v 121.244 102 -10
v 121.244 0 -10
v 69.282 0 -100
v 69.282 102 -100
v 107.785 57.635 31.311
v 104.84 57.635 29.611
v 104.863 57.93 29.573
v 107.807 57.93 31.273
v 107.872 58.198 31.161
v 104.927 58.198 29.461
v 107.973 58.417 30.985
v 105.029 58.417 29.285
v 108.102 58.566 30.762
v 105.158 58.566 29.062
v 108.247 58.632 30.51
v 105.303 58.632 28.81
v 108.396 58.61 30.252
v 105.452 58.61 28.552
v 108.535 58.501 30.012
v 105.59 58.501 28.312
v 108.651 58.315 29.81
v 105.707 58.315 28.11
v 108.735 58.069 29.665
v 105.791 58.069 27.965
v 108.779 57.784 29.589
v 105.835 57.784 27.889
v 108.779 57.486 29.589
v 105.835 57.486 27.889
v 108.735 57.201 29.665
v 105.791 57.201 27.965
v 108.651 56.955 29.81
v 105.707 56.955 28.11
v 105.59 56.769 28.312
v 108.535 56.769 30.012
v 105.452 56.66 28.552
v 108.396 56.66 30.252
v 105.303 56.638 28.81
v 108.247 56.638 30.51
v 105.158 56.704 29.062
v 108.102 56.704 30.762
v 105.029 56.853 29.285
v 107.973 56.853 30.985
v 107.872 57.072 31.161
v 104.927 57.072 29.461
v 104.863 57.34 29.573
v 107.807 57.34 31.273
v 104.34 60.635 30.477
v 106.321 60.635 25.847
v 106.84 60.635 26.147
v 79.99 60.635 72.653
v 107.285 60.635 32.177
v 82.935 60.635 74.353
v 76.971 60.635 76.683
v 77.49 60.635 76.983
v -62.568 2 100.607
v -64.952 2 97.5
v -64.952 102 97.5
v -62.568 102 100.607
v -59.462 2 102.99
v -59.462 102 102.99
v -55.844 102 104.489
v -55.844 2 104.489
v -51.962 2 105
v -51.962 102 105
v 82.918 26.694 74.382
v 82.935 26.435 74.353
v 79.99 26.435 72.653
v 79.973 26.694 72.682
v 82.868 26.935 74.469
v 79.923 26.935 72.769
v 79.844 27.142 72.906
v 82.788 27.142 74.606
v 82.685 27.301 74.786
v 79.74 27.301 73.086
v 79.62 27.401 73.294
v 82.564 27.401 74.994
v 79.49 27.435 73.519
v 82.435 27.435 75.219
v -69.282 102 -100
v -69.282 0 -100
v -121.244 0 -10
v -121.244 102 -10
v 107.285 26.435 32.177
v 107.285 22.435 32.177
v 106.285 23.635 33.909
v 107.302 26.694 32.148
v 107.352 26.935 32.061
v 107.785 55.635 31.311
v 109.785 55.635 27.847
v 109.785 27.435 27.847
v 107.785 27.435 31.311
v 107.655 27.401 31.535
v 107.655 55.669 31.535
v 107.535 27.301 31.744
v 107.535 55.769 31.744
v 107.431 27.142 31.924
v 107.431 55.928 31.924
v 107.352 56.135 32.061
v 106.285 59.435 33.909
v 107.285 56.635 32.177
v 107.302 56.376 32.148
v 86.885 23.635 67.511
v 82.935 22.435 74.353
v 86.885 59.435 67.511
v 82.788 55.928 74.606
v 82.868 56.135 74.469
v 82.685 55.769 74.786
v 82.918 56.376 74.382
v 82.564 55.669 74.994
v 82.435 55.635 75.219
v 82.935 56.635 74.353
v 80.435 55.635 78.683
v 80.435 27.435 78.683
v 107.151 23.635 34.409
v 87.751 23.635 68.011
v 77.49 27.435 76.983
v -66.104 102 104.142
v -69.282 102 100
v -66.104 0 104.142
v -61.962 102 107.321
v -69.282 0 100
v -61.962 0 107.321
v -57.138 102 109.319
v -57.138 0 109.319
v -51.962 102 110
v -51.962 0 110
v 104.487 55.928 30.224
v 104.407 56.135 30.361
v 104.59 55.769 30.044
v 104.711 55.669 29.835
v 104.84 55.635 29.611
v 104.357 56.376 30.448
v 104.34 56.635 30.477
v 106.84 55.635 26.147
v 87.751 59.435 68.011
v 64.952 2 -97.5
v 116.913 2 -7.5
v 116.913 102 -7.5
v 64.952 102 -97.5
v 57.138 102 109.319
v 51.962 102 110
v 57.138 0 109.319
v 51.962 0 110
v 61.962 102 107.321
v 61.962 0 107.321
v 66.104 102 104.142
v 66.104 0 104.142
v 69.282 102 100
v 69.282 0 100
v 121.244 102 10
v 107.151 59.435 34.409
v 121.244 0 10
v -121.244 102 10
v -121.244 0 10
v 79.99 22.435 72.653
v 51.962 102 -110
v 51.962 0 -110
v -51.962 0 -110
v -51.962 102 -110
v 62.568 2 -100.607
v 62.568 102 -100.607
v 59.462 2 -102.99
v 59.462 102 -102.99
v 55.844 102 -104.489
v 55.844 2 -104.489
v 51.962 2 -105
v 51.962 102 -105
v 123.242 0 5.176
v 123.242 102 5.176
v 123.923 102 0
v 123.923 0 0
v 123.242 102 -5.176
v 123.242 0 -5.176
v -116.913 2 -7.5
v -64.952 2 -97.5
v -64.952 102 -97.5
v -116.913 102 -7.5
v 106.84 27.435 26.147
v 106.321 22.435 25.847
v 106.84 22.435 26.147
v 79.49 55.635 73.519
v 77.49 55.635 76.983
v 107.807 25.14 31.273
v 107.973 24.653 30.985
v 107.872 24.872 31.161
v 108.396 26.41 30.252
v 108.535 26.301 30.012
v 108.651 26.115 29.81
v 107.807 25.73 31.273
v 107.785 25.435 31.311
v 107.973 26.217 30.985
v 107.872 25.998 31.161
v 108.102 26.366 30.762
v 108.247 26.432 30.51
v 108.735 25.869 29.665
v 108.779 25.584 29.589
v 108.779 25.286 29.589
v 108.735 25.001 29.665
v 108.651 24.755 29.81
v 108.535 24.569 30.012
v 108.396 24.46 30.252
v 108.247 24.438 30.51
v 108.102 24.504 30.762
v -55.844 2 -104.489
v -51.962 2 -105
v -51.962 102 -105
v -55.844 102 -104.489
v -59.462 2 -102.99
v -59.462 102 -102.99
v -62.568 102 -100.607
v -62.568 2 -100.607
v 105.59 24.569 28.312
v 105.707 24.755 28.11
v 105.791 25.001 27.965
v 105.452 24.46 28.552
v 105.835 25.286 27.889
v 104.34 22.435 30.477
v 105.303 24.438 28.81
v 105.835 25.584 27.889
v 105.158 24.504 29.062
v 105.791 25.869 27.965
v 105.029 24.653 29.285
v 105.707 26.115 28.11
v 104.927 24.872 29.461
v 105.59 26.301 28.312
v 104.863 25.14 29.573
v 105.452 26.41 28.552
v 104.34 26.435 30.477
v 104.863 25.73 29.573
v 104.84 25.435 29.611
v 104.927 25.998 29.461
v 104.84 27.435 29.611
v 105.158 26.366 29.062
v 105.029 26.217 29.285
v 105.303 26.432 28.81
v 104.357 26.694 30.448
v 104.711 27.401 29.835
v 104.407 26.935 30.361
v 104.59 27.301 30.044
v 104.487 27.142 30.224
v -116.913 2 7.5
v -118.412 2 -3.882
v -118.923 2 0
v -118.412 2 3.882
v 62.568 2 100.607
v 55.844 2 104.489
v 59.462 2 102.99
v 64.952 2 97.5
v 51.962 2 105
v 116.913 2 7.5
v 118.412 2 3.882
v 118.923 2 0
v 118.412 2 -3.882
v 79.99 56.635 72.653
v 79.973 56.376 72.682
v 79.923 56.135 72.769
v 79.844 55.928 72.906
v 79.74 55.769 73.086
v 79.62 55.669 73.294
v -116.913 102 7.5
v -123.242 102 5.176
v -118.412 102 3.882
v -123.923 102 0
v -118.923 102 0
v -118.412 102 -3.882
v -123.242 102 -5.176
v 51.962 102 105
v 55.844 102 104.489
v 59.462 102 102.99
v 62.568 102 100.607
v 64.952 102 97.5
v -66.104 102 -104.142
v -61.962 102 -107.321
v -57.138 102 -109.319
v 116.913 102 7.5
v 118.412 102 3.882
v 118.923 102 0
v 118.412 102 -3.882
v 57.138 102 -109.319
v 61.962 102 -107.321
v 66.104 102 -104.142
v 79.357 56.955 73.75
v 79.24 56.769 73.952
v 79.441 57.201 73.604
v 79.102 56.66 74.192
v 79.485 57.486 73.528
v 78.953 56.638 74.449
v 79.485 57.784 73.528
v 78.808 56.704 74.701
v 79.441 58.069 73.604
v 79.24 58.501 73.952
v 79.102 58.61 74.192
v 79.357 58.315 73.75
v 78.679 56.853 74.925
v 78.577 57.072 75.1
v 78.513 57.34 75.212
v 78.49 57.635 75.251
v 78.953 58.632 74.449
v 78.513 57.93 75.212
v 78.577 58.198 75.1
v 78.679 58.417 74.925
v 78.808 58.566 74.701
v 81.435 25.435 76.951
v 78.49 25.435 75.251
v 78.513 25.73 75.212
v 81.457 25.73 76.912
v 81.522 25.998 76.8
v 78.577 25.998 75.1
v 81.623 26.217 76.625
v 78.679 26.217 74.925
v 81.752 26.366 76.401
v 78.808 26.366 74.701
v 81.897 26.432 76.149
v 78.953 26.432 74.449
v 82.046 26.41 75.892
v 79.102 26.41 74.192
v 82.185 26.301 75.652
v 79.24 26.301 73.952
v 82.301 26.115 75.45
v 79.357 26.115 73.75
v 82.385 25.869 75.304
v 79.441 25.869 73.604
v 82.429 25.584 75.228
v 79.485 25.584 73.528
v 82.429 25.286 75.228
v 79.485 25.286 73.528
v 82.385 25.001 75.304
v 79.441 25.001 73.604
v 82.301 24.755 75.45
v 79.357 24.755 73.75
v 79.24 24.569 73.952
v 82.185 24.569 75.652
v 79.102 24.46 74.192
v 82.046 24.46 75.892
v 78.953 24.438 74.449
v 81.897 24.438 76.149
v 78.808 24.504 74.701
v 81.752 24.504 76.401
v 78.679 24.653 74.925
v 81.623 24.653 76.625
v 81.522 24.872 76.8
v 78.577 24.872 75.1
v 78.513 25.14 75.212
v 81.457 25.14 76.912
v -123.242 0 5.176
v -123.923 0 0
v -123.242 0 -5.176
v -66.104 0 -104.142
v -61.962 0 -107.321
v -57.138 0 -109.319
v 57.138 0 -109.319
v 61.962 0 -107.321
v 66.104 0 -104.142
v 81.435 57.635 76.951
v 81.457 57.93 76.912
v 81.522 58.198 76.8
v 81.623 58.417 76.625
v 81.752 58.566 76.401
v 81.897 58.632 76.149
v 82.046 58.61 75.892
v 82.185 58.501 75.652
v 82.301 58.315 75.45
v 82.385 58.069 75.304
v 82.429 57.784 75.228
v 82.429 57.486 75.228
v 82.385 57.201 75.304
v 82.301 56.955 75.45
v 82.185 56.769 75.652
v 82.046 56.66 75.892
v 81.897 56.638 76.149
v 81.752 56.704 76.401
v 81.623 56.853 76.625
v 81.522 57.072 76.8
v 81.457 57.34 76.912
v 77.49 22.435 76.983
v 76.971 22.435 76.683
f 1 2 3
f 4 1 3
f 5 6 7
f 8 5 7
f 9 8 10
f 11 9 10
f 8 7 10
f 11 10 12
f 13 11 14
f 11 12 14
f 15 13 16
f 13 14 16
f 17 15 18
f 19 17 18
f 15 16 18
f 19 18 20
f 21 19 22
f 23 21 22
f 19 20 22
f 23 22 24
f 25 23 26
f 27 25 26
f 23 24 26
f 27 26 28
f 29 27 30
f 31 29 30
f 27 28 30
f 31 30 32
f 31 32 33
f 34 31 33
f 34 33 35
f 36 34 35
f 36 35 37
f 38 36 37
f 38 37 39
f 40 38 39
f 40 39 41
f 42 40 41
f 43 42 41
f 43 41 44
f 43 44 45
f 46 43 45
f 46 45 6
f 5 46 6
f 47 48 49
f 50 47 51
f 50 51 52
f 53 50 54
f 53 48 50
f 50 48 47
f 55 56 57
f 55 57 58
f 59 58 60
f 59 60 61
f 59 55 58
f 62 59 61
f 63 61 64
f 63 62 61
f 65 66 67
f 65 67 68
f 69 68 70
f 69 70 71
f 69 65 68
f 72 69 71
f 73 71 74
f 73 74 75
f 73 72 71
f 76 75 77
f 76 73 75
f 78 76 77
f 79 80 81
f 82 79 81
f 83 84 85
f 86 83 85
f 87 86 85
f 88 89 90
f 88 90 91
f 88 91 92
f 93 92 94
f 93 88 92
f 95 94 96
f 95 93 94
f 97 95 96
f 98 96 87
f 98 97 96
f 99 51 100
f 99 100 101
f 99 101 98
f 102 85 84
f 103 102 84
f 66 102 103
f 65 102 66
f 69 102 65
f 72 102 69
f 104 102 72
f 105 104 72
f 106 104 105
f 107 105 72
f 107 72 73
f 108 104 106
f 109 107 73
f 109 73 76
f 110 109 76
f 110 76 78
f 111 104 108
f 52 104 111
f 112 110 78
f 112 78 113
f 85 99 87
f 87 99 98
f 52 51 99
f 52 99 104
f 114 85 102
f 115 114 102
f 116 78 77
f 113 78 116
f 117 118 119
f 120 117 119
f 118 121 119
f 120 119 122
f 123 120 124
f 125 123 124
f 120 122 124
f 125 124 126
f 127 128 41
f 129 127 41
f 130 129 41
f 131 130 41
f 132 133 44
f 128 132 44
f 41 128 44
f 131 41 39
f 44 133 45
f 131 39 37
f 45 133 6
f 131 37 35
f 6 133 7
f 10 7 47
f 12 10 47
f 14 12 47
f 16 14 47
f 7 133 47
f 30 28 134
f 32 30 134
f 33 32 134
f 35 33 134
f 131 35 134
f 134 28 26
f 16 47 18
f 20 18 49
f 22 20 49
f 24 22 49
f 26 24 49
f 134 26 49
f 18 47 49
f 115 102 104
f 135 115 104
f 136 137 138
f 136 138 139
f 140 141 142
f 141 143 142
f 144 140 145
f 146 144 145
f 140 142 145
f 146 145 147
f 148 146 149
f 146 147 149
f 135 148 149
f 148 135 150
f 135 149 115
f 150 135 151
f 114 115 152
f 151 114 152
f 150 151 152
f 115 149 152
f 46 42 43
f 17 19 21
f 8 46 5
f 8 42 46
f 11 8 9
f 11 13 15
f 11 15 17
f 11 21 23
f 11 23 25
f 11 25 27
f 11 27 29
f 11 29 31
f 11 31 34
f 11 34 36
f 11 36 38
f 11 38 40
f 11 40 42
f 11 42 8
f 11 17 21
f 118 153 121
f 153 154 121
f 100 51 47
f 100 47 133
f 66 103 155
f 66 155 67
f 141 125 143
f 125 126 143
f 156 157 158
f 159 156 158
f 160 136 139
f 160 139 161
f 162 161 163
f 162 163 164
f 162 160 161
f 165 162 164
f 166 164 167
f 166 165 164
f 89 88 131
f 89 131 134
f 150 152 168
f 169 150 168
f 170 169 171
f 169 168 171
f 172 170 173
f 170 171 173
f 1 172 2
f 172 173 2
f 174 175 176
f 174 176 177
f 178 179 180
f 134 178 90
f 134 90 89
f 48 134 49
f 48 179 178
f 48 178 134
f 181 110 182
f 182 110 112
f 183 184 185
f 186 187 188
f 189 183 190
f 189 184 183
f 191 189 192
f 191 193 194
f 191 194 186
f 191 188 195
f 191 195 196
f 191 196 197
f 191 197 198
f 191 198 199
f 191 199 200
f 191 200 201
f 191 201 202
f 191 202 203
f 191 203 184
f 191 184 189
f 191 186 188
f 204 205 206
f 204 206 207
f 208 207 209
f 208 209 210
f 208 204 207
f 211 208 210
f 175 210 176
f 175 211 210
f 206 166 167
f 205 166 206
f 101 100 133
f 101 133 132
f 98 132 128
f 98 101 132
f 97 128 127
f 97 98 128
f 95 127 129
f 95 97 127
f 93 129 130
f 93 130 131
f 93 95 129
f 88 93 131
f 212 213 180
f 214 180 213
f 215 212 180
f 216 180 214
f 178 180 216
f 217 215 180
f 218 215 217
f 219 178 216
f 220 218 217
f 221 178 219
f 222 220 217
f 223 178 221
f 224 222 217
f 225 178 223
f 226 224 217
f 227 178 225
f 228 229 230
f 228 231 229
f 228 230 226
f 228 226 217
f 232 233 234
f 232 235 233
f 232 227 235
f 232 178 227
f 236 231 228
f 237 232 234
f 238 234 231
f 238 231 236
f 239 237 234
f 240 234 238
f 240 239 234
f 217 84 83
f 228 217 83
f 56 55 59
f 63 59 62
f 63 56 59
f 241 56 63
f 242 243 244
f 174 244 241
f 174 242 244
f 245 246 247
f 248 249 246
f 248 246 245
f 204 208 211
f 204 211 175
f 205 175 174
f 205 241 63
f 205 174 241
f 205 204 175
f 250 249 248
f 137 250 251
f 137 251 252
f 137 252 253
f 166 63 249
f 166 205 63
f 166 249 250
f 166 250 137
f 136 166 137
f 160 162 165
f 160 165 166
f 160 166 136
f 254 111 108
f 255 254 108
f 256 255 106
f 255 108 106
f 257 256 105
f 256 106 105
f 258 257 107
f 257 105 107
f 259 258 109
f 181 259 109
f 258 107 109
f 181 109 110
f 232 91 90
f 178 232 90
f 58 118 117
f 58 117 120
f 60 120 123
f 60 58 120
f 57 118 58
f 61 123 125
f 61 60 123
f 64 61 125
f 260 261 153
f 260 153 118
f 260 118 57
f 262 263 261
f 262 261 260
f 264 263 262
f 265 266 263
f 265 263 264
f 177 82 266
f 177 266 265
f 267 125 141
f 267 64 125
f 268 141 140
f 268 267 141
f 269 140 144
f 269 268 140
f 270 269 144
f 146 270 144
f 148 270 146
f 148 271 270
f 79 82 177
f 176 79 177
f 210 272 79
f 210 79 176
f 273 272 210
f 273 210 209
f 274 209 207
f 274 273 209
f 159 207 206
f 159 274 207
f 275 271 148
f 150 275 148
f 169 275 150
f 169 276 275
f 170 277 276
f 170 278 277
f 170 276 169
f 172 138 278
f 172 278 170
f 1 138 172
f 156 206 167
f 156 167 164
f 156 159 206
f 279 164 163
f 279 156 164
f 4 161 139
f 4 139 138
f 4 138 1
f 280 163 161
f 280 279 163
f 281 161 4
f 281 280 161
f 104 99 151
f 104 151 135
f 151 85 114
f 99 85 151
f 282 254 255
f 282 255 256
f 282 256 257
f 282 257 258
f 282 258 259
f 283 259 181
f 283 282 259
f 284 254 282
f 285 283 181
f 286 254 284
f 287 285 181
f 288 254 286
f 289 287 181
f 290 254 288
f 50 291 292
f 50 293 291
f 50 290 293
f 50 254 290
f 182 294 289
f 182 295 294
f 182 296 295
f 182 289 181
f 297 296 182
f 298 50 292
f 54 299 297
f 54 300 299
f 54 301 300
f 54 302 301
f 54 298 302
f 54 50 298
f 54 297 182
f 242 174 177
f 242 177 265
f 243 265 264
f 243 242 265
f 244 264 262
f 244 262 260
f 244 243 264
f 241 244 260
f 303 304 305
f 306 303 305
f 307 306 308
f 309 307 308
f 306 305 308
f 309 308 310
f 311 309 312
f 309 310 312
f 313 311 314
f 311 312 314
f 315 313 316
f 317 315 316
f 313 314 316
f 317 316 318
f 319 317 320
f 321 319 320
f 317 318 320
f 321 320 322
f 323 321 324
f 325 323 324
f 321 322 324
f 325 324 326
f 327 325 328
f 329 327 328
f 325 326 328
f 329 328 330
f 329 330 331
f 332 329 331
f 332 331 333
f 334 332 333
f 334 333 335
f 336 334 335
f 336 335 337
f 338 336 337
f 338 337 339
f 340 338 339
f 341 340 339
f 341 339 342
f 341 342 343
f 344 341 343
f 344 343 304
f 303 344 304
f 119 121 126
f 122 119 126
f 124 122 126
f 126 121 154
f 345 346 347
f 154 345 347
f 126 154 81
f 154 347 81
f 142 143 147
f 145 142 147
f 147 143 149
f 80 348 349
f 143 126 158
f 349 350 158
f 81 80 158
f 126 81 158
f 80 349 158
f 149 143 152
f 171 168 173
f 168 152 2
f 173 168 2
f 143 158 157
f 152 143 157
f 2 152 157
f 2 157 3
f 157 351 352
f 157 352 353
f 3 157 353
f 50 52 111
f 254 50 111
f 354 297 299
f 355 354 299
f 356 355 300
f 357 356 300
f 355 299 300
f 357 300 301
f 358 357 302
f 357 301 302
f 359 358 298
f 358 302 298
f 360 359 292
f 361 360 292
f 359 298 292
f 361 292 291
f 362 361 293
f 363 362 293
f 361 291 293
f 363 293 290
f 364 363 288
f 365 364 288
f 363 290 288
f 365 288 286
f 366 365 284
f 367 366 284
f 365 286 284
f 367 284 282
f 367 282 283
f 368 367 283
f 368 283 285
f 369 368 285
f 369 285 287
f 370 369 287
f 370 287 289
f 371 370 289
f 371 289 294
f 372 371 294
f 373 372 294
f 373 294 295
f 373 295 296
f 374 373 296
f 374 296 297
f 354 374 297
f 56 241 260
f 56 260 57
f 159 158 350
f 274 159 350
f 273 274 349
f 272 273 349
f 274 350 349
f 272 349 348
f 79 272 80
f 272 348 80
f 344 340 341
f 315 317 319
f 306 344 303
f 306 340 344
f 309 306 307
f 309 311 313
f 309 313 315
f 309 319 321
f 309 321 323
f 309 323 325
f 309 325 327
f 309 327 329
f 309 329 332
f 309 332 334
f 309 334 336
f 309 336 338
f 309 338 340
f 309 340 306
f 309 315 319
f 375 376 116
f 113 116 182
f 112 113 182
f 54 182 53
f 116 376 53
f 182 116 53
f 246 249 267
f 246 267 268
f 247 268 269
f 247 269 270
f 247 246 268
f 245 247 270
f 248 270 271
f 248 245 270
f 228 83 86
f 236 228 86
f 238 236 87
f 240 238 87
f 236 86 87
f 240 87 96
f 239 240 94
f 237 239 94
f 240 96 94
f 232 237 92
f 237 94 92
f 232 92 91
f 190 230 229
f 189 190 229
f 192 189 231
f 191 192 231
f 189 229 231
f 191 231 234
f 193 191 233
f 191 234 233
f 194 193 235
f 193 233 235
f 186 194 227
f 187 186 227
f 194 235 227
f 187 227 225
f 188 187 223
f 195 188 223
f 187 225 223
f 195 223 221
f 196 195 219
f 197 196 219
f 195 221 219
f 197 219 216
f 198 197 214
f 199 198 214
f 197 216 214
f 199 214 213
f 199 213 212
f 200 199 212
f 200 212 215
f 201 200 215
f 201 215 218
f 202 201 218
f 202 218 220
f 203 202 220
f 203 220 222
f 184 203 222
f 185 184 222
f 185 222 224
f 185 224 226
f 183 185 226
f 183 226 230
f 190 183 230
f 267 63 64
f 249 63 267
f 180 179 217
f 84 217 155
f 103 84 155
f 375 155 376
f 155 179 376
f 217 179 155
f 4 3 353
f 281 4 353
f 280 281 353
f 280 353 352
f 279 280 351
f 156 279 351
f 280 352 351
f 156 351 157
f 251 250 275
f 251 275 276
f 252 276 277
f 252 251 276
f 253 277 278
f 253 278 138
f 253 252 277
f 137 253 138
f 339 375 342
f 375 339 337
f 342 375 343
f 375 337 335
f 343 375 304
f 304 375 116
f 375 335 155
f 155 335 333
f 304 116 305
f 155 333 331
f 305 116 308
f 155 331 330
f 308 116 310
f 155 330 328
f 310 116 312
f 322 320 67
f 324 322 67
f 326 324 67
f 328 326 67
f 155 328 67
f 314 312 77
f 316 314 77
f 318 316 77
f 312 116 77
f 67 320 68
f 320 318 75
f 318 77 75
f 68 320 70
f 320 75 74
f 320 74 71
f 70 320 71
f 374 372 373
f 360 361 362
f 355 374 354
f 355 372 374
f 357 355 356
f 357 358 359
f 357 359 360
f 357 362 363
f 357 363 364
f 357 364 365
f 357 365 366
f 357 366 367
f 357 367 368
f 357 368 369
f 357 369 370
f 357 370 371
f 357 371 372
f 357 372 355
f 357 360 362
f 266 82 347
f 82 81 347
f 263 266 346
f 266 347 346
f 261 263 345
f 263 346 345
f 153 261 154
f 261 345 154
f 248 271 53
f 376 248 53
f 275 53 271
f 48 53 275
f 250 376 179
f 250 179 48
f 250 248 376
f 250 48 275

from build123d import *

# Parameters (mm, degrees)
SALIENTE_EXTRUIR1_DEPTH = 2
SALIENTE_EXTRUIR2_DEPTH = 100
CROQUIS3_W              = 58.7
CROQUIS3_H              = 38.2
CROQUIS3_R              = 1.5
CROQUIS3_W_2            = 38.8
CROQUIS3_H_2            = 35.8
CORTAR_EXTRUIR1_DEPTH   = 1
CROQUIS4_W              = 38.8
CROQUIS4_H              = 35.8
CORTAR_EXTRUIR2_DEPTH   = 12
CROQUIS5_W              = 58.7
CROQUIS5_H              = 38.2
CROQUIS5_R              = 1.5
CORTAR_EXTRUIR3_DEPTH   = 3
CROQUIS6_R              = 1
SALIENTE_EXTRUIR3_DEPTH = 3.4
CROQUIS8_R              = 1
CORTAR_EXTRUIR5_DEPTH   = 4
CORTAR_EXTRUIR6_DEPTH   = 0.6


with BuildPart() as part:
    # Croquis1 → Saliente-Extruir1 (new body)
    with BuildSketch(Plane(origin=(0, 0, 0), x_dir=(1, 0, 0), z_dir=(0, 1, 0))):
        with BuildLine():
            Line((-121.24355653, -10), (-69.282032303, -100))
            ThreePointArc((-69.282032303, -100), (-61.961524227, -107.320508076), (-51.961524227, -110))
            Line((-51.961524227, -110), (51.961524227, -110))
            ThreePointArc((51.961524227, -110), (61.961524227, -107.320508076), (69.282032303, -100))
            Line((69.282032303, -100), (121.24355653, -10))
            ThreePointArc((121.24355653, -10), (123.923048454, 0), (121.24355653, 10))
            Line((121.24355653, 10), (69.282032303, 100))
            ThreePointArc((69.282032303, 100), (61.961524227, 107.320508076), (51.961524227, 110))
            Line((51.961524227, 110), (-51.961524227, 110))
            ThreePointArc((-51.961524227, 110), (-61.961524227, 107.320508076), (-69.282032303, 100))
            Line((-69.282032303, 100), (-121.24355653, 10))
            ThreePointArc((-121.24355653, 10), (-123.923048454, 0), (-121.24355653, -10))
        make_face()
    extrude(amount=SALIENTE_EXTRUIR1_DEPTH)

    # Croquis2 → Saliente-Extruir2 (add)
    with BuildSketch(Plane(origin=(0, 2, 0), x_dir=(1, 0, 0), z_dir=(0, 1, 0))):
        with BuildLine():
            Line((-69.282032303, 100), (-121.24355653, 10))
            ThreePointArc((-121.24355653, 10), (-123.923048454, 0), (-121.24355653, -10))
            Line((-121.24355653, -10), (-69.282032303, -100))
            ThreePointArc((-69.282032303, -100), (-61.961524227, -107.320508076), (-51.961524227, -110))
            Line((-51.961524227, -110), (51.961524227, -110))
            ThreePointArc((51.961524227, -110), (61.961524227, -107.320508076), (69.282032303, -100))
            Line((69.282032303, -100), (121.24355653, -10))
            ThreePointArc((121.24355653, -10), (123.923048454, 0), (121.24355653, 10))
            Line((121.24355653, 10), (69.282032303, 100))
            ThreePointArc((69.282032303, 100), (61.961524227, 107.320508076), (51.961524227, 110))
            Line((51.961524227, 110), (-51.961524227, 110))
            ThreePointArc((-51.961524227, 110), (-61.961524227, 107.320508076), (-69.282032303, 100))
        make_face()
        with BuildLine():
            Line((-64.951905284, 97.5), (-116.913429511, 7.5))
            ThreePointArc((-116.913429511, 7.5), (-118.923048454, 0), (-116.913429511, -7.5))
            Line((-116.913429511, -7.5), (-64.951905284, -97.5))
            ThreePointArc((-64.951905284, -97.5), (-59.461524227, -102.990381057), (-51.961524227, -105))
            Line((-51.961524227, -105), (51.961524227, -105))
            ThreePointArc((51.961524227, -105), (59.461524227, -102.990381057), (64.951905284, -97.5))
            Line((64.951905284, -97.5), (116.913429511, -7.5))
            ThreePointArc((116.913429511, -7.5), (118.923048454, 0), (116.913429511, 7.5))
            Line((116.913429511, 7.5), (64.951905284, 97.5))
            ThreePointArc((64.951905284, 97.5), (59.461524227, 102.990381057), (51.961524227, 105))
            Line((51.961524227, 105), (-51.961524227, 105))
            ThreePointArc((-51.961524227, 105), (-59.461524227, 102.990381057), (-64.951905284, 97.5))
        make_face(mode=Mode.SUBTRACT)
    extrude(amount=SALIENTE_EXTRUIR2_DEPTH)

    # Croquis3 → Cortar-Extruir1 (cut)
    with BuildSketch(Plane(origin=(90.932667397, 0, 52.5), x_dir=(-0.49999999999999983, 0, 0.8660254037844387), z_dir=(-0.8660254037844387, 0, -0.49999999999999983))):
        with Locations((-1.426190801, 41.535179267)):
            Rectangle(CROQUIS3_W, CROQUIS3_H)
        with Locations((24.923809199, 57.635179267)):
            Circle(CROQUIS3_R, mode=Mode.SUBTRACT)
        with Locations((24.923809199, 25.435179267)):
            Circle(CROQUIS3_R, mode=Mode.SUBTRACT)
        with Locations((-27.776190801, 25.435179267)):
            Circle(CROQUIS3_R, mode=Mode.SUBTRACT)
        with Locations((-27.776190801, 57.635179267)):
            Circle(CROQUIS3_R, mode=Mode.SUBTRACT)
        with Locations((-4.376190801, 41.535179267)):
            Rectangle(CROQUIS3_W_2, CROQUIS3_H_2, mode=Mode.SUBTRACT)
    extrude(amount=-CORTAR_EXTRUIR1_DEPTH, mode=Mode.SUBTRACT)

    # Croquis4 → Cortar-Extruir2 (cut)
    with BuildSketch(Plane(origin=(90.932667397, 0, 52.5), x_dir=(-0.49999999999999983, 0, 0.8660254037844387), z_dir=(-0.8660254037844387, 0, -0.49999999999999983))):
        with Locations((-4.376190801, 41.535179267)):
            Rectangle(CROQUIS4_W, CROQUIS4_H)
    extrude(amount=-CORTAR_EXTRUIR2_DEPTH, mode=Mode.SUBTRACT)

    # Croquis5 → Cortar-Extruir3 (cut)
    with BuildSketch(Plane(origin=(91.798692801, 0, 53), x_dir=(-0.5, 0, 0.8660254037844386), z_dir=(-0.8660254037844387, 0, -0.5000000000000001))):
        with Locations((-1.426190801, 41.535179267)):
            Rectangle(CROQUIS5_W, CROQUIS5_H)
        with Locations((24.923809199, 25.435179267)):
            Circle(CROQUIS5_R, mode=Mode.SUBTRACT)
        with Locations((24.923809199, 57.635179267)):
            Circle(CROQUIS5_R, mode=Mode.SUBTRACT)
        with Locations((-27.776190801, 57.635179267)):
            Circle(CROQUIS5_R, mode=Mode.SUBTRACT)
        with Locations((-27.776190801, 25.435179267)):
            Circle(CROQUIS5_R, mode=Mode.SUBTRACT)
    extrude(amount=-CORTAR_EXTRUIR3_DEPTH, mode=Mode.SUBTRACT)

    # Croquis6 → Saliente-Extruir3 (add)
    # profile 1 of 4: a face of its own
    with BuildSketch(Plane(origin=(94.396769013, 0, 54.5), x_dir=(-0.5000000000000001, 0, 0.8660254037844386), z_dir=(-0.8660254037844386, 0, -0.5000000000000001))):
        with BuildLine():
            Line((-30.776190801, 60.635179267), (-25.776190801, 60.635179267))
            Line((-25.776190801, 60.635179267), (-25.776190801, 56.635179267))
            ThreePointArc((-25.776190801, 56.635179267), (-26.06908402, 55.928072486), (-26.776190801, 55.635179267))
            Line((-26.776190801, 55.635179267), (-30.776190801, 55.635179267))
            Line((-30.776190801, 55.635179267), (-30.776190801, 60.635179267))
        make_face()
        with Locations((-27.776190801, 57.635179267)):
            Circle(CROQUIS6_R, mode=Mode.SUBTRACT)
    # profile 2 of 4: a face of its own
    with BuildSketch(Plane(origin=(94.396769013, 0, 54.5), x_dir=(-0.5000000000000001, 0, 0.8660254037844386), z_dir=(-0.8660254037844386, 0, -0.5000000000000001))):
        with BuildLine():
            Line((-30.776190801, 22.435179267), (-25.776190801, 22.435179267))
            Line((-25.776190801, 22.435179267), (-25.776190801, 26.435179267))
            ThreePointArc((-25.776190801, 26.435179267), (-26.06908402, 27.142286049), (-26.776190801, 27.435179267))
            Line((-26.776190801, 27.435179267), (-30.776190801, 27.435179267))
            Line((-30.776190801, 27.435179267), (-30.776190801, 22.435179267))
        make_face()
        with Locations((-27.776190801, 25.435179267)):
            Circle(CROQUIS6_R, mode=Mode.SUBTRACT)
    # profile 3 of 4: a face of its own
    with BuildSketch(Plane(origin=(94.396769013, 0, 54.5), x_dir=(-0.5000000000000001, 0, 0.8660254037844386), z_dir=(-0.8660254037844386, 0, -0.5000000000000001))):
        with BuildLine():
            Line((27.923809199, 22.435179267), (22.923809199, 22.435179267))
            Line((22.923809199, 22.435179267), (22.923809199, 26.435179267))
            ThreePointArc((22.923809199, 26.435179267), (23.216702418, 27.142286049), (23.923809199, 27.435179267))
            Line((23.923809199, 27.435179267), (27.923809199, 27.435179267))
            Line((27.923809199, 27.435179267), (27.923809199, 22.435179267))
        make_face()
        with Locations((24.923809199, 25.435179267)):
            Circle(CROQUIS6_R, mode=Mode.SUBTRACT)
    # profile 4 of 4: a face of its own
    with BuildSketch(Plane(origin=(94.396769013, 0, 54.5), x_dir=(-0.5000000000000001, 0, 0.8660254037844386), z_dir=(-0.8660254037844386, 0, -0.5000000000000001))):
        with BuildLine():
            Line((27.923809199, 60.635179267), (22.923809199, 60.635179267))
            Line((22.923809199, 60.635179267), (22.923809199, 56.635179267))
            ThreePointArc((22.923809199, 56.635179267), (23.216702418, 55.928072486), (23.923809199, 55.635179267))
            Line((23.923809199, 55.635179267), (27.923809199, 55.635179267))
            Line((27.923809199, 55.635179267), (27.923809199, 60.635179267))
        make_face()
        with Locations((24.923809199, 57.635179267)):
            Circle(CROQUIS6_R, mode=Mode.SUBTRACT)
    extrude(amount=SALIENTE_EXTRUIR3_DEPTH)

    # Croquis8 → Cortar-Extruir5 (cut)
    with BuildSketch(Plane(origin=(90.932667397, 0, 52.5), x_dir=(-0.49999999999999983, 0, 0.8660254037844387), z_dir=(-0.8660254037844387, 0, -0.49999999999999983))):
        with Locations((-27.776190801, 57.635179267)):
            Circle(CROQUIS8_R)
        with Locations((-27.776190801, 25.435179267)):
            Circle(CROQUIS8_R)
        with Locations((24.923809199, 25.435179267)):
            Circle(CROQUIS8_R)
        with Locations((24.923809199, 57.635179267)):
            Circle(CROQUIS8_R)
    extrude(amount=-CORTAR_EXTRUIR5_DEPTH, mode=Mode.SUBTRACT)

    # Croquis10 → Cortar-Extruir6 (cut)
    with BuildSketch(Plane(origin=(90.932667397, 0, 52.5), x_dir=(-0.49999999999999983, 0, 0.8660254037844387), z_dir=(-0.8660254037844387, 0, -0.49999999999999983))):
        Polygon((27.923809199, 22.435179267), (27.923809199, 60.635179267), (-30.776190801, 60.635179267), (-30.776190801, 55.635179267), (-30.776190801, 27.435179267), (-30.776190801, 22.435179267), align=None)
    extrude(amount=-CORTAR_EXTRUIR6_DEPTH, mode=Mode.SUBTRACT)


solid = part.part
